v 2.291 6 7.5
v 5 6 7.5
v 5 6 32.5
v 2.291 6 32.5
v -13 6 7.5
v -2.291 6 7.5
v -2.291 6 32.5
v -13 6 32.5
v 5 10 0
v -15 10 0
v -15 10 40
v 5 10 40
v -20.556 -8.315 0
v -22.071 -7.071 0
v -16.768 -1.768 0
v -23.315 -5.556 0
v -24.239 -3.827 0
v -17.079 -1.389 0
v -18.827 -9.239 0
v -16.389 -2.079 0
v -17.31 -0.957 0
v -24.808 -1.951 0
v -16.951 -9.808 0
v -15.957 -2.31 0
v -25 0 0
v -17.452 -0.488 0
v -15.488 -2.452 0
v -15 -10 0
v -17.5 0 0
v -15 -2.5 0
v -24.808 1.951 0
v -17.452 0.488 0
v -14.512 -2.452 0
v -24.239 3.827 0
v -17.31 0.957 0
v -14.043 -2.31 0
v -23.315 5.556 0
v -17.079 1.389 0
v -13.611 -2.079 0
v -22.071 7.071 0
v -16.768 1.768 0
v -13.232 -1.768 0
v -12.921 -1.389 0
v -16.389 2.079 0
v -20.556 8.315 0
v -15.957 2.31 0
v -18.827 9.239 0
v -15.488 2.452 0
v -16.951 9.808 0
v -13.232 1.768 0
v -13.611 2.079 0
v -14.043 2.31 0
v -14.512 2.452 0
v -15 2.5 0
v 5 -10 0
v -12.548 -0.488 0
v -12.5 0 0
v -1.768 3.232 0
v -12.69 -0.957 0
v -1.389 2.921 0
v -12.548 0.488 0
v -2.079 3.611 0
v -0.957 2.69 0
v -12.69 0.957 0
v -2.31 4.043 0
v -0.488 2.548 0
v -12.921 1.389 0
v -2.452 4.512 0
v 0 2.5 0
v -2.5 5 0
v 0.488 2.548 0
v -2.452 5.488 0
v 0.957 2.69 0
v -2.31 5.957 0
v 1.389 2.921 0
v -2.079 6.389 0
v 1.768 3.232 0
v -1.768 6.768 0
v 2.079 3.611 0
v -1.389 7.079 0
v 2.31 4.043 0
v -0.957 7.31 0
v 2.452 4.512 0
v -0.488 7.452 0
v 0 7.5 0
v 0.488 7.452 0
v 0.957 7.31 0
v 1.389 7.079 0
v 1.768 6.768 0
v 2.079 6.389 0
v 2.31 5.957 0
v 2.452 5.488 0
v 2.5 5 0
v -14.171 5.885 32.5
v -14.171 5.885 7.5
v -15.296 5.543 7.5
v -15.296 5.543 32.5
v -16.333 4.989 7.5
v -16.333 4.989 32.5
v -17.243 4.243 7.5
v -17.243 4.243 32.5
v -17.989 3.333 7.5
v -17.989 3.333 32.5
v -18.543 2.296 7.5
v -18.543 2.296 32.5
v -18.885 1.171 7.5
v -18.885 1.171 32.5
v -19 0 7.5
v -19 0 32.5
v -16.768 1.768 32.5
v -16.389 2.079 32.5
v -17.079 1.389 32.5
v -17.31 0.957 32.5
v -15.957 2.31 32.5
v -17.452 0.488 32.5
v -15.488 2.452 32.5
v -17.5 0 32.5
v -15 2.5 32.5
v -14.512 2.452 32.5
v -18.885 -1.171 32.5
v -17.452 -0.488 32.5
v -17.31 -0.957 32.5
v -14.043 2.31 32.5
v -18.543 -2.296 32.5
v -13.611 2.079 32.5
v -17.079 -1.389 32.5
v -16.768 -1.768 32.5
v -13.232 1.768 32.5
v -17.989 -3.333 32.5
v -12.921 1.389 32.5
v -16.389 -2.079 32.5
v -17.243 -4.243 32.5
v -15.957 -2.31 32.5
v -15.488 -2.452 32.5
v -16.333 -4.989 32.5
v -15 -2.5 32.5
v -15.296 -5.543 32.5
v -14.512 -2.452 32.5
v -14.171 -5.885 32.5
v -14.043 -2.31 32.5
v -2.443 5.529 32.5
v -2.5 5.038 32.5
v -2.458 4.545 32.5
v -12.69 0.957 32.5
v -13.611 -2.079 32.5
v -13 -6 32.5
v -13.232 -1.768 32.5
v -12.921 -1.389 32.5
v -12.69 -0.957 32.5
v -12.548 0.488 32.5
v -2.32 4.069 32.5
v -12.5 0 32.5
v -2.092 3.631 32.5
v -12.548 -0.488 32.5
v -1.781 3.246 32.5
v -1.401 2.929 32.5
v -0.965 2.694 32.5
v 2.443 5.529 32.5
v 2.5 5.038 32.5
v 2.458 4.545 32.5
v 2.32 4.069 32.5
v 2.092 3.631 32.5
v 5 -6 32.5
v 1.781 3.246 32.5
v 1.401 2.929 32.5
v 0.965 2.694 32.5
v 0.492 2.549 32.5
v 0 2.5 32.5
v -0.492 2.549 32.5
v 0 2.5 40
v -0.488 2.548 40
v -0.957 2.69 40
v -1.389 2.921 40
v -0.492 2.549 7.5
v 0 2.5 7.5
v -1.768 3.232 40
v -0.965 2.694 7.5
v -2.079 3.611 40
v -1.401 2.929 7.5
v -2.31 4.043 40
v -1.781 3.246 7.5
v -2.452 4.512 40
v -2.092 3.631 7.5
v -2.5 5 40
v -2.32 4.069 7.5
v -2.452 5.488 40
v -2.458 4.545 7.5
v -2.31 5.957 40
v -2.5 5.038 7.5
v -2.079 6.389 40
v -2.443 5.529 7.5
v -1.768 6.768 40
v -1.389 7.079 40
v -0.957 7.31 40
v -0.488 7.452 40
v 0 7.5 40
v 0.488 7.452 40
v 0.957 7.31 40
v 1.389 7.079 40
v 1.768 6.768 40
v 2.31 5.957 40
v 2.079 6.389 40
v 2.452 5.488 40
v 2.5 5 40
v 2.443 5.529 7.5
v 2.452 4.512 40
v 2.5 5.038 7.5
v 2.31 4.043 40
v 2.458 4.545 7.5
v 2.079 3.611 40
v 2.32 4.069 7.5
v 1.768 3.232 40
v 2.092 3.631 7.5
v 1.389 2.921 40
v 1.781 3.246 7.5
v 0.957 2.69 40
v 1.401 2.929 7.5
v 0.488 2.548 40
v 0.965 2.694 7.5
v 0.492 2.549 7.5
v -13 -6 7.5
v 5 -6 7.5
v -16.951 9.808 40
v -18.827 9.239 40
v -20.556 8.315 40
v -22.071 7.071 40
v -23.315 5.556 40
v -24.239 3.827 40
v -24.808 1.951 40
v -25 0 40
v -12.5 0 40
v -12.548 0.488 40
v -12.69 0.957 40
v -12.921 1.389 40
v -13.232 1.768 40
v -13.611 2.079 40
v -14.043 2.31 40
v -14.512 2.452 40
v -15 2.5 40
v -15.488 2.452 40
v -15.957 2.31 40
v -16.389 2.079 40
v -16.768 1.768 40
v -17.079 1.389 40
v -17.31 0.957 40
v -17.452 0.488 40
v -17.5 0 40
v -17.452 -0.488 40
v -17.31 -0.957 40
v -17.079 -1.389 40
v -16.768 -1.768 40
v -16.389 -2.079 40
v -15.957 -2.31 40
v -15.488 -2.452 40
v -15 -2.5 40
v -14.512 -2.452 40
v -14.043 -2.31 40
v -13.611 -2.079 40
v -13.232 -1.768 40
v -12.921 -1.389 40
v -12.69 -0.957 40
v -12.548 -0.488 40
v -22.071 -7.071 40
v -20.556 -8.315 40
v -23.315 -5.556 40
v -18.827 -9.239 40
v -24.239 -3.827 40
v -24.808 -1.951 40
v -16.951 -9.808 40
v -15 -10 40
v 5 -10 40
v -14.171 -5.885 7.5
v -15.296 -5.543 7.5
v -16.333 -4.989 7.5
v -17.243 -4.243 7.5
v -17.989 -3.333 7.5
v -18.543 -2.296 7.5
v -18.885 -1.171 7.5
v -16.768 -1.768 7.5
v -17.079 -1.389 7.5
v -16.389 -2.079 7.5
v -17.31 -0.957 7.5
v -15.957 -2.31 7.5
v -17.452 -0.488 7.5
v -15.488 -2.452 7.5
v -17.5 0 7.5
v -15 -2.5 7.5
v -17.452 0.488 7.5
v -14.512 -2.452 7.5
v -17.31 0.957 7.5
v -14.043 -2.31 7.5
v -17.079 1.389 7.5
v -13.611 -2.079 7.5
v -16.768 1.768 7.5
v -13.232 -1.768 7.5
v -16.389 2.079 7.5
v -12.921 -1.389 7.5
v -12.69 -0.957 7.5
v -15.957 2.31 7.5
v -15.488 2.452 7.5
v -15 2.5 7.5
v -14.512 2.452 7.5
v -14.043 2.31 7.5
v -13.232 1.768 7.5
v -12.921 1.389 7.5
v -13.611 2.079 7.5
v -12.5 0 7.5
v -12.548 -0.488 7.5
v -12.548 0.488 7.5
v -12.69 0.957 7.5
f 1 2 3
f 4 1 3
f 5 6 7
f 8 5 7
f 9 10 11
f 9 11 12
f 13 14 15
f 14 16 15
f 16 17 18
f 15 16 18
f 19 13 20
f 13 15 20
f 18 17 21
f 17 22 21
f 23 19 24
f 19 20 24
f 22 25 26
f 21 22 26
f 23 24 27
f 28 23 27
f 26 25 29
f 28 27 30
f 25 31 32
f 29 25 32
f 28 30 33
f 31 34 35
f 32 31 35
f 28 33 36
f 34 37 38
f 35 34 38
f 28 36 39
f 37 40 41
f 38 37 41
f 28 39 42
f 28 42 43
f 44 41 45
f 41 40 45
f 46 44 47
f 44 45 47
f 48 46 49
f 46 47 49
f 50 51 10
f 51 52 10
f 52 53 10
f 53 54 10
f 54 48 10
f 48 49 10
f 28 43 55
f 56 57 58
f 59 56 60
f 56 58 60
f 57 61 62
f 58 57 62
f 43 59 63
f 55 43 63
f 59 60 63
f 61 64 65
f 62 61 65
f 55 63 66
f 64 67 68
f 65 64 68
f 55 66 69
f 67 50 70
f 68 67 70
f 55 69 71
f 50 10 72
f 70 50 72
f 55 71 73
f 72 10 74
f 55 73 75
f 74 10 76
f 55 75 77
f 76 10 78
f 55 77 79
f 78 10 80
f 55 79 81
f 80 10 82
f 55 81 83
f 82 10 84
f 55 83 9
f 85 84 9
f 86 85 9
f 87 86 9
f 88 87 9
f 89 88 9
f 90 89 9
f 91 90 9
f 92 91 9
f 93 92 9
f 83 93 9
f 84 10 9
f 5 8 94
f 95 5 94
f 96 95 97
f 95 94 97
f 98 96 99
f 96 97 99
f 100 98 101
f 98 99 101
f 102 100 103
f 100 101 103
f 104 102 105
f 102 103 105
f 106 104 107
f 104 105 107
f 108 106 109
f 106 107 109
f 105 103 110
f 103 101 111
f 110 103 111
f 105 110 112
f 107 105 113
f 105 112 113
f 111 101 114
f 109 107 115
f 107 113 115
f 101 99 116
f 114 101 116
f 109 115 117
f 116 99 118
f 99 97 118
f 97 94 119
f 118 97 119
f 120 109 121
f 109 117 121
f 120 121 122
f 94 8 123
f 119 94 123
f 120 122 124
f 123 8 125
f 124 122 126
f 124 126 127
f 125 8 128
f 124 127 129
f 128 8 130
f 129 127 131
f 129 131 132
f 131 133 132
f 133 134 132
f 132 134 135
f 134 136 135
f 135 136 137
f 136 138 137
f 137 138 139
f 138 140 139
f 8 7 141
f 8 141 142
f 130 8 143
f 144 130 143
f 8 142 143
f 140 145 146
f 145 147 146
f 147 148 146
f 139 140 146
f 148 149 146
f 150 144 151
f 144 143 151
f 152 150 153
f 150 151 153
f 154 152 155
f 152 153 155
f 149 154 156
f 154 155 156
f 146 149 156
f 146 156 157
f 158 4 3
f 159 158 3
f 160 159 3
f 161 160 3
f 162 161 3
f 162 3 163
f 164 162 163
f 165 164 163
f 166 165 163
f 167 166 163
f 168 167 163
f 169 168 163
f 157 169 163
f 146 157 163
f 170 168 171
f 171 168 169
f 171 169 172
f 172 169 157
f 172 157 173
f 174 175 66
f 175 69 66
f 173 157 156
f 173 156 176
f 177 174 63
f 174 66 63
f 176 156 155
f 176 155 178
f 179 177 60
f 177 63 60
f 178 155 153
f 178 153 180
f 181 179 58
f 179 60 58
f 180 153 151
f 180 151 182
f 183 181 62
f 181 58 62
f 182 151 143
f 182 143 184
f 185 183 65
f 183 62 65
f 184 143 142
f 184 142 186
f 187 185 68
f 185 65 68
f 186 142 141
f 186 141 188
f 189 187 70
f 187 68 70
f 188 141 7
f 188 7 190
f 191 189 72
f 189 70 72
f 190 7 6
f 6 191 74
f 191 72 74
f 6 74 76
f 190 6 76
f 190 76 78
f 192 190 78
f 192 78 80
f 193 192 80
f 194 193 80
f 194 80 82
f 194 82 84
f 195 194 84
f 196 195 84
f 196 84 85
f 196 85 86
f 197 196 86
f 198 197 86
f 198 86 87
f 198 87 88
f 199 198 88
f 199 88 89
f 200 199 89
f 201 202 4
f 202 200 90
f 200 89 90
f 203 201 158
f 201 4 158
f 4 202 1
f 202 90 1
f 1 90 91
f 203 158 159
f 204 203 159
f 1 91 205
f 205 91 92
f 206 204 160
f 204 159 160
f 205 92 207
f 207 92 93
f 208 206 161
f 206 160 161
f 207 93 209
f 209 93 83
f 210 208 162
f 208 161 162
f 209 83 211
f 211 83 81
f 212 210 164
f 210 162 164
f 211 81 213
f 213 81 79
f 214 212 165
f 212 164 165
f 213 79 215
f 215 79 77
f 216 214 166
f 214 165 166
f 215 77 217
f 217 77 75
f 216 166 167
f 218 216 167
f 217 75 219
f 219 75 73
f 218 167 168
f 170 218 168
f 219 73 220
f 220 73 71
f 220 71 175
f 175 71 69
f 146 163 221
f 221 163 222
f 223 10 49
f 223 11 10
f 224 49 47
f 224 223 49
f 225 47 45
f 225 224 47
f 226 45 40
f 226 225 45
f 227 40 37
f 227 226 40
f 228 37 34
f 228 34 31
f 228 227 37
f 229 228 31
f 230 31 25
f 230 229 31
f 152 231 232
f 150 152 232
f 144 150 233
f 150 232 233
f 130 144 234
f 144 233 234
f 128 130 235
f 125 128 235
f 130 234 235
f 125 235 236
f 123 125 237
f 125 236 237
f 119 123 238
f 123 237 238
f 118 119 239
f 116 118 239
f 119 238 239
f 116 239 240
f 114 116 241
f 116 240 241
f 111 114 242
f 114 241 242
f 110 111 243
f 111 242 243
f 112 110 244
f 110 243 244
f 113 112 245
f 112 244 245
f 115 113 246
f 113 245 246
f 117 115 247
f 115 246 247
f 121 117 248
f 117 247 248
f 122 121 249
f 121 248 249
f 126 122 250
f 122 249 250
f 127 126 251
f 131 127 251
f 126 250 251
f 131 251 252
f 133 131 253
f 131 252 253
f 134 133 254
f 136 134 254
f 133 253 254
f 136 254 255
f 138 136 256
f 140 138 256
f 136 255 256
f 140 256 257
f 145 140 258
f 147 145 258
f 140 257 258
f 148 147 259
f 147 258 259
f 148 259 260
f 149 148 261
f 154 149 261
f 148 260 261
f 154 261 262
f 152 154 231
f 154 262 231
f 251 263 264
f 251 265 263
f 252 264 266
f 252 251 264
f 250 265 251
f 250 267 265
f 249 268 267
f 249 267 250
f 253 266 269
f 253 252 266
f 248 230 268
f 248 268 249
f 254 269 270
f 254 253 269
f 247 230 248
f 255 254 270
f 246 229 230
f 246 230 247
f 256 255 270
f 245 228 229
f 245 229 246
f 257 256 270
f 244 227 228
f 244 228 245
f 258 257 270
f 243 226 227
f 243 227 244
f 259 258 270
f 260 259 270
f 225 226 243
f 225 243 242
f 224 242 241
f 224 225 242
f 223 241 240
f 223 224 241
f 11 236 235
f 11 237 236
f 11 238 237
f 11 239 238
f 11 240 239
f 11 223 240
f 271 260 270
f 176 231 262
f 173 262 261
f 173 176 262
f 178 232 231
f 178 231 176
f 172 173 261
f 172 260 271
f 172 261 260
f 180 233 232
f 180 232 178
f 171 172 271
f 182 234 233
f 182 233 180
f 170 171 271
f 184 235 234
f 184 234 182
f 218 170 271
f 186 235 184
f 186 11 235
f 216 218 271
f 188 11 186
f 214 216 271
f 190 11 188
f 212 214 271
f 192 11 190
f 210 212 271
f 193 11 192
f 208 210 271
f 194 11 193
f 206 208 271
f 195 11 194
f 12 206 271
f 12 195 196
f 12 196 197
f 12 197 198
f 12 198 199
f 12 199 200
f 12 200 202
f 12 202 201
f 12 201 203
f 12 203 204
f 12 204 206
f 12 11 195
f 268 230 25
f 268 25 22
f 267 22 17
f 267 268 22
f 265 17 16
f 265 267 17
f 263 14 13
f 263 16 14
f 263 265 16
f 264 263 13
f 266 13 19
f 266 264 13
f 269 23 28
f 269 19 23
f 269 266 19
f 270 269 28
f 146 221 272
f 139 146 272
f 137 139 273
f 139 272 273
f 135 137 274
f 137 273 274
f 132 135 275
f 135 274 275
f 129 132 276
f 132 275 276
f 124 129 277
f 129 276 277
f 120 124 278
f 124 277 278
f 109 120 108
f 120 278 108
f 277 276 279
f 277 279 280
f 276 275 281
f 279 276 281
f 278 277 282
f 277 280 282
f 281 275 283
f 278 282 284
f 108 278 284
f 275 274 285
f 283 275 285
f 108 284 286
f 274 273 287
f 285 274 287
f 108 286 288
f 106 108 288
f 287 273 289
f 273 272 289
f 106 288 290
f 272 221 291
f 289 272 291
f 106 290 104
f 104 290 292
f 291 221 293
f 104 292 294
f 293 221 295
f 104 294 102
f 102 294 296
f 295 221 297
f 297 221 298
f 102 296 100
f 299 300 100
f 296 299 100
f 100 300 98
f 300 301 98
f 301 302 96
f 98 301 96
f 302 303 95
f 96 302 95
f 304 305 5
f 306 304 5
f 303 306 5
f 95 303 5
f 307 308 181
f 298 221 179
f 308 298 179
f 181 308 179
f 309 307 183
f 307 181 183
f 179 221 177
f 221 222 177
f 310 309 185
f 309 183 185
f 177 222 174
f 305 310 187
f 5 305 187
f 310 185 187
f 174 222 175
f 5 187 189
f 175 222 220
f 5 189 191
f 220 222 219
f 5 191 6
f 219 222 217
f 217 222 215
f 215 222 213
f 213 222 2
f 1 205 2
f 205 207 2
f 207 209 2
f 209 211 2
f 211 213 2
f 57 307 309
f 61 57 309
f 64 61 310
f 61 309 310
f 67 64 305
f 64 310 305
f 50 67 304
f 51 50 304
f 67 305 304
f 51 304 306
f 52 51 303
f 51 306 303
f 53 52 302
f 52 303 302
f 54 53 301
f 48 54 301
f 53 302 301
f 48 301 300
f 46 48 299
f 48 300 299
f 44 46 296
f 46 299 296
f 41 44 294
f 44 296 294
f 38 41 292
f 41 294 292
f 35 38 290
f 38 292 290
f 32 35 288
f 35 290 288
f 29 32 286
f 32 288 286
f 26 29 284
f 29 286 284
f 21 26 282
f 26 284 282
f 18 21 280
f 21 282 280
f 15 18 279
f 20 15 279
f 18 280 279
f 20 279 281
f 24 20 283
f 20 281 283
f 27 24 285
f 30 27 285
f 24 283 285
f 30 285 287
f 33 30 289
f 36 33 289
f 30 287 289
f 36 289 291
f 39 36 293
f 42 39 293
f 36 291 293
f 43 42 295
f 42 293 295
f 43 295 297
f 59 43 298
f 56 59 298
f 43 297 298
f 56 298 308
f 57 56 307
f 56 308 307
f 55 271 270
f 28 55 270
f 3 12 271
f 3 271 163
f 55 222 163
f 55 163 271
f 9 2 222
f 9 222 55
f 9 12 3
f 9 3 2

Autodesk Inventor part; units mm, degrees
ref_plane "YZ Plane" through (0, 0, 0) normal (1, 0, 0) x (0, 1, 0)
ref_plane "XZ Plane" through (0, 0, 0) normal (0, 1, 0) x (-1, 0, 0)
ref_plane "XY Plane" through (0, 0, 0) normal (0, 0, 1) x (1, 0, 0)
sketch "Sketch1" plane through (0, 0, 0) normal (0, 0, 1) x (1, 0, 0)
  line L0 (-25, 10) -> (25, 10)
  line L1 (25, 10) -> (25, -10)
  line L2 (25, -10) -> (-25, -10)
  line L3 (-25, -10) -> (-25, 10)
  line L4 (-25, 10) -> (25, -10) construction
  line L5 (25, 10) -> (-25, -10) construction
  point P0 (0, 0)
  dimension "d0" = 50
  dimension "d1" = 20
extrude "Extrusion1" add sketch "Sketch1" along normal blind 40
sketch "Sketch2" plane through (0, 0, 40) normal (0, 0, 1) x (1, 0, 0)
  circle A0 centre (-15, 0) radius 2.5
  line L0 (-25, 10) -> (-25, -10) projected
  line L1 (-25, -10) -> (25, -10) projected
  point P0 (0, 0)
  dimension "d4" = 5
  dimension "d5" = 10
  dimension "d6" = 10
extrude "Extrusion2" cut sketch "Sketch2" against normal through all
sketch "Sketch3" plane through (25, -10, 0) normal (1, 0, 0) x (0, 0, -1)
  line L0 (-32.5, 4) -> (-7.5, 4)
  line L1 (-7.5, 4) -> (-7.5, 16)
  line L2 (-7.5, 16) -> (-32.5, 16)
  line L3 (-32.5, 16) -> (-32.5, 4)
  line L4 (-32.5, 4) -> (-7.5, 16) construction
  line L5 (-7.5, 4) -> (-32.5, 16) construction
  point P0 (0, 10)
  point P1 (-20, 10)
  dimension "d9" = 25
  dimension "d10" = 12
extrude "Extrusion3" cut sketch "Sketch3" against normal blind 44
full round fillet "Full Round Fillet1" first side at (10.3333, 6, 15.8333) centre faces at (-19, -2, 15.8333) second side at (10.3333, -6, 24.1667)
full round fillet "Full Round Fillet2" first side at (8.3333, 10, 13.3333) centre faces at (-25, 3.3333, 13.3333) second side at (-8.3333, -10, 13.3333)
sketch "Sketch4" plane through (25, -10, 0) normal (1, 0, 0) x (0, 0, -1)
  line L0 (-40, 0) -> (-40, 20) projected
  line L1 (0, 20) -> (0, 0) projected
  line L2 (-40, 20) -> (0, 20)
  line L3 (0, 20) -> (0, 0)
  line L4 (0, 0) -> (-40, 0)
  line L5 (-40, 0) -> (-40, 20)
  point P0 (0, 10)
extrude "Extrusion4" cut sketch "Sketch4" against normal blind 20
sketch "Sketch5" plane through (0, 0, 40) normal (0, 0, 1) x (1, 0, 0)
  line L0 (5, 10) -> (-15, 10) projected
  line L1 (5, -10) -> (5, 10) projected
  point P0 (0, 0)
  point P1 (0, 5)
  dimension "d15" = 5
  dimension "d16" = 5
hole "Hole1" at (0, 5, 40) direction (0, 0, -1) diameter 5 end through all
properties part number "3rd arm"
